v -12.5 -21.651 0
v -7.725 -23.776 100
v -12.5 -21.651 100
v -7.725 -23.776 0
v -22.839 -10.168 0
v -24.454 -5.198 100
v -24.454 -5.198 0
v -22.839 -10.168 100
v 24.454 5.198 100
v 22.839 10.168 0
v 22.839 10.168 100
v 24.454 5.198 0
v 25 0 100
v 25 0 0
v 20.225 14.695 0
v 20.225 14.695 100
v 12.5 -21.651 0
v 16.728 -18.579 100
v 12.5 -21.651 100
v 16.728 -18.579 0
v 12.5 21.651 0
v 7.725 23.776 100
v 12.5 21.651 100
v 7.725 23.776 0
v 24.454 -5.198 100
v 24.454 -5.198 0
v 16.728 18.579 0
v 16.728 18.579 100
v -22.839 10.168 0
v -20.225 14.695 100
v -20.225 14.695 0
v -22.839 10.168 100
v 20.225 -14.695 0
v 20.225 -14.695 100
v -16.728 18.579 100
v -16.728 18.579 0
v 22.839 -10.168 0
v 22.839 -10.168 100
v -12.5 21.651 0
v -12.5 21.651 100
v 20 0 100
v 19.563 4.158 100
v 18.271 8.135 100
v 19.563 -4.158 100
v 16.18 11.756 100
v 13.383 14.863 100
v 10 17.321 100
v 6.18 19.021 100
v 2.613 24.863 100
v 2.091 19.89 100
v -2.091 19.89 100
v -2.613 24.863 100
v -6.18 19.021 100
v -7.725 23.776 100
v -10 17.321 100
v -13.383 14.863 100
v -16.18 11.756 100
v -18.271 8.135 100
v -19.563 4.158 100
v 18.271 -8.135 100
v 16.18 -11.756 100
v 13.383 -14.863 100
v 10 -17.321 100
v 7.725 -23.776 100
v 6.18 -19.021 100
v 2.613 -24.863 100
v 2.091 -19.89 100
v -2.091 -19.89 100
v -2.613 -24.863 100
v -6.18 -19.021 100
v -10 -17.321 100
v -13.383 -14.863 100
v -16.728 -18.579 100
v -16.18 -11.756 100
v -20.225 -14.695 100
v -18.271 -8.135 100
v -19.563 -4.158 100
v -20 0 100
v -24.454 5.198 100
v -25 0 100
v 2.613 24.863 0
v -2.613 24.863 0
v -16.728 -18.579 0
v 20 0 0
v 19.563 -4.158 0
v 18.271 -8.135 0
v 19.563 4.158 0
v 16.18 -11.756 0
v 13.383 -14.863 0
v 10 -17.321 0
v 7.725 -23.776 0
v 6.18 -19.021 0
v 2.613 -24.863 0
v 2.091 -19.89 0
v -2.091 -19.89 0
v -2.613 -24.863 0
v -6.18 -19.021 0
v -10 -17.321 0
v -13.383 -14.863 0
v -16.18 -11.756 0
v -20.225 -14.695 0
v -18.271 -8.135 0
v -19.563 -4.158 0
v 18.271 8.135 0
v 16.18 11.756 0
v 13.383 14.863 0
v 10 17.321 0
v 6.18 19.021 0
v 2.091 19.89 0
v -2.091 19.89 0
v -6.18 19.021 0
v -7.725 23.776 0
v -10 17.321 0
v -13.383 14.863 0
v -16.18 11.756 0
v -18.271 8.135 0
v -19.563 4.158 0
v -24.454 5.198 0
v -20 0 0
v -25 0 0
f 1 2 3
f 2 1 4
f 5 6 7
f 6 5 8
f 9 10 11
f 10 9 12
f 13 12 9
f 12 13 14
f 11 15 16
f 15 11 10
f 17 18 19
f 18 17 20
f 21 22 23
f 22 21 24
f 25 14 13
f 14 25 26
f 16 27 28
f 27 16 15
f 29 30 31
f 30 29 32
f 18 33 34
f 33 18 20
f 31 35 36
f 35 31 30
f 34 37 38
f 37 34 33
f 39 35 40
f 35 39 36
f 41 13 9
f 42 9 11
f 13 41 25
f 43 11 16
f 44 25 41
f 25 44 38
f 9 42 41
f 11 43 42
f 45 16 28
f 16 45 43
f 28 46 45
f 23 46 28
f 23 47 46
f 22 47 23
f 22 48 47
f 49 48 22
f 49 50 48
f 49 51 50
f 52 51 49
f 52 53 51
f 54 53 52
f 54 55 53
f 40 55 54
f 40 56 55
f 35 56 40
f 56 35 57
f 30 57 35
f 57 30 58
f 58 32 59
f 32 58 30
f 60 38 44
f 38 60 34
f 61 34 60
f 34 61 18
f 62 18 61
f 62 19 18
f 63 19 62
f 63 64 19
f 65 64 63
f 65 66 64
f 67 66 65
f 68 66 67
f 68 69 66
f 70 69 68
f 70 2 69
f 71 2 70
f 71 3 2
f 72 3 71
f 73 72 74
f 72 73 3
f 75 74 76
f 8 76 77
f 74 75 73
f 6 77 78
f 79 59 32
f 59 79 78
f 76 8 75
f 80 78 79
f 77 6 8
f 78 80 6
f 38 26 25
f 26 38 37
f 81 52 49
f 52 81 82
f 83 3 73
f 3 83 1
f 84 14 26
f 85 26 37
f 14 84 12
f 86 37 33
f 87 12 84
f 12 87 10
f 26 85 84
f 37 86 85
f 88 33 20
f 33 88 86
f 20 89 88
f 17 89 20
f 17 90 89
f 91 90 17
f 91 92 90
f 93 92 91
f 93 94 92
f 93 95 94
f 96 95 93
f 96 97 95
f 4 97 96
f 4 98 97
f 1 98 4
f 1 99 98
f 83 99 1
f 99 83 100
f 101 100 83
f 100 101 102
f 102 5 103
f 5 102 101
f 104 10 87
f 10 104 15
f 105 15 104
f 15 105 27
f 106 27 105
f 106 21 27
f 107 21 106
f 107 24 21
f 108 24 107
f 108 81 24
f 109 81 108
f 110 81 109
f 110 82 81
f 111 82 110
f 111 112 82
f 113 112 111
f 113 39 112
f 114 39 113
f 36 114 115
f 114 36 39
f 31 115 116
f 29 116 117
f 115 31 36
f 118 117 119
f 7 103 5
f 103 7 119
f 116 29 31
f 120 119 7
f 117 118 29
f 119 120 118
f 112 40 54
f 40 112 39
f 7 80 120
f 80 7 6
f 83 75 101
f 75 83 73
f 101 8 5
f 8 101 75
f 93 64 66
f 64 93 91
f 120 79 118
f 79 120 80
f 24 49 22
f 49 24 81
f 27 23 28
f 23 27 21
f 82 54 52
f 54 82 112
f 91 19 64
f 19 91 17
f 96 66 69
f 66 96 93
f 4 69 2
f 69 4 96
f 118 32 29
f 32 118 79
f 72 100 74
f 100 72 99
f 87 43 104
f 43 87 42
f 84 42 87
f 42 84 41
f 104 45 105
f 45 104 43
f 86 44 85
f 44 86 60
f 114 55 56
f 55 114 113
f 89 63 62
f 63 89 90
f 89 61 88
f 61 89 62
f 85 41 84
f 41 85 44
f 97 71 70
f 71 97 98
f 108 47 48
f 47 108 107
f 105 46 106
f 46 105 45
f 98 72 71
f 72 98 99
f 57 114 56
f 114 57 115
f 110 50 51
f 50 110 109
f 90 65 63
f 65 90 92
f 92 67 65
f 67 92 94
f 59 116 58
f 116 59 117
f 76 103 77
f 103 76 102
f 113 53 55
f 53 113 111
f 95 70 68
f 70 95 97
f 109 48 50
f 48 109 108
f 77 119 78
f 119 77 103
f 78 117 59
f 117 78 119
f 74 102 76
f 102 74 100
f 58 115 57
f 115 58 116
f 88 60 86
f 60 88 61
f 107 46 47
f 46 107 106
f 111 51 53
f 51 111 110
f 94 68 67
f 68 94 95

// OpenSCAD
//Altura del tub
tub_mida = 100; // [1:500]

//Diametre del tub
tub_diametre = 50; // [1:100]

//Gruix de la pared del tub
tub_gruix = 5; // [1:100]

difference()
{
cylinder(r=tub_diametre/2,h=tub_mida);
cylinder(r=(tub_diametre/2)-tub_gruix,h=tub_mida);
}
